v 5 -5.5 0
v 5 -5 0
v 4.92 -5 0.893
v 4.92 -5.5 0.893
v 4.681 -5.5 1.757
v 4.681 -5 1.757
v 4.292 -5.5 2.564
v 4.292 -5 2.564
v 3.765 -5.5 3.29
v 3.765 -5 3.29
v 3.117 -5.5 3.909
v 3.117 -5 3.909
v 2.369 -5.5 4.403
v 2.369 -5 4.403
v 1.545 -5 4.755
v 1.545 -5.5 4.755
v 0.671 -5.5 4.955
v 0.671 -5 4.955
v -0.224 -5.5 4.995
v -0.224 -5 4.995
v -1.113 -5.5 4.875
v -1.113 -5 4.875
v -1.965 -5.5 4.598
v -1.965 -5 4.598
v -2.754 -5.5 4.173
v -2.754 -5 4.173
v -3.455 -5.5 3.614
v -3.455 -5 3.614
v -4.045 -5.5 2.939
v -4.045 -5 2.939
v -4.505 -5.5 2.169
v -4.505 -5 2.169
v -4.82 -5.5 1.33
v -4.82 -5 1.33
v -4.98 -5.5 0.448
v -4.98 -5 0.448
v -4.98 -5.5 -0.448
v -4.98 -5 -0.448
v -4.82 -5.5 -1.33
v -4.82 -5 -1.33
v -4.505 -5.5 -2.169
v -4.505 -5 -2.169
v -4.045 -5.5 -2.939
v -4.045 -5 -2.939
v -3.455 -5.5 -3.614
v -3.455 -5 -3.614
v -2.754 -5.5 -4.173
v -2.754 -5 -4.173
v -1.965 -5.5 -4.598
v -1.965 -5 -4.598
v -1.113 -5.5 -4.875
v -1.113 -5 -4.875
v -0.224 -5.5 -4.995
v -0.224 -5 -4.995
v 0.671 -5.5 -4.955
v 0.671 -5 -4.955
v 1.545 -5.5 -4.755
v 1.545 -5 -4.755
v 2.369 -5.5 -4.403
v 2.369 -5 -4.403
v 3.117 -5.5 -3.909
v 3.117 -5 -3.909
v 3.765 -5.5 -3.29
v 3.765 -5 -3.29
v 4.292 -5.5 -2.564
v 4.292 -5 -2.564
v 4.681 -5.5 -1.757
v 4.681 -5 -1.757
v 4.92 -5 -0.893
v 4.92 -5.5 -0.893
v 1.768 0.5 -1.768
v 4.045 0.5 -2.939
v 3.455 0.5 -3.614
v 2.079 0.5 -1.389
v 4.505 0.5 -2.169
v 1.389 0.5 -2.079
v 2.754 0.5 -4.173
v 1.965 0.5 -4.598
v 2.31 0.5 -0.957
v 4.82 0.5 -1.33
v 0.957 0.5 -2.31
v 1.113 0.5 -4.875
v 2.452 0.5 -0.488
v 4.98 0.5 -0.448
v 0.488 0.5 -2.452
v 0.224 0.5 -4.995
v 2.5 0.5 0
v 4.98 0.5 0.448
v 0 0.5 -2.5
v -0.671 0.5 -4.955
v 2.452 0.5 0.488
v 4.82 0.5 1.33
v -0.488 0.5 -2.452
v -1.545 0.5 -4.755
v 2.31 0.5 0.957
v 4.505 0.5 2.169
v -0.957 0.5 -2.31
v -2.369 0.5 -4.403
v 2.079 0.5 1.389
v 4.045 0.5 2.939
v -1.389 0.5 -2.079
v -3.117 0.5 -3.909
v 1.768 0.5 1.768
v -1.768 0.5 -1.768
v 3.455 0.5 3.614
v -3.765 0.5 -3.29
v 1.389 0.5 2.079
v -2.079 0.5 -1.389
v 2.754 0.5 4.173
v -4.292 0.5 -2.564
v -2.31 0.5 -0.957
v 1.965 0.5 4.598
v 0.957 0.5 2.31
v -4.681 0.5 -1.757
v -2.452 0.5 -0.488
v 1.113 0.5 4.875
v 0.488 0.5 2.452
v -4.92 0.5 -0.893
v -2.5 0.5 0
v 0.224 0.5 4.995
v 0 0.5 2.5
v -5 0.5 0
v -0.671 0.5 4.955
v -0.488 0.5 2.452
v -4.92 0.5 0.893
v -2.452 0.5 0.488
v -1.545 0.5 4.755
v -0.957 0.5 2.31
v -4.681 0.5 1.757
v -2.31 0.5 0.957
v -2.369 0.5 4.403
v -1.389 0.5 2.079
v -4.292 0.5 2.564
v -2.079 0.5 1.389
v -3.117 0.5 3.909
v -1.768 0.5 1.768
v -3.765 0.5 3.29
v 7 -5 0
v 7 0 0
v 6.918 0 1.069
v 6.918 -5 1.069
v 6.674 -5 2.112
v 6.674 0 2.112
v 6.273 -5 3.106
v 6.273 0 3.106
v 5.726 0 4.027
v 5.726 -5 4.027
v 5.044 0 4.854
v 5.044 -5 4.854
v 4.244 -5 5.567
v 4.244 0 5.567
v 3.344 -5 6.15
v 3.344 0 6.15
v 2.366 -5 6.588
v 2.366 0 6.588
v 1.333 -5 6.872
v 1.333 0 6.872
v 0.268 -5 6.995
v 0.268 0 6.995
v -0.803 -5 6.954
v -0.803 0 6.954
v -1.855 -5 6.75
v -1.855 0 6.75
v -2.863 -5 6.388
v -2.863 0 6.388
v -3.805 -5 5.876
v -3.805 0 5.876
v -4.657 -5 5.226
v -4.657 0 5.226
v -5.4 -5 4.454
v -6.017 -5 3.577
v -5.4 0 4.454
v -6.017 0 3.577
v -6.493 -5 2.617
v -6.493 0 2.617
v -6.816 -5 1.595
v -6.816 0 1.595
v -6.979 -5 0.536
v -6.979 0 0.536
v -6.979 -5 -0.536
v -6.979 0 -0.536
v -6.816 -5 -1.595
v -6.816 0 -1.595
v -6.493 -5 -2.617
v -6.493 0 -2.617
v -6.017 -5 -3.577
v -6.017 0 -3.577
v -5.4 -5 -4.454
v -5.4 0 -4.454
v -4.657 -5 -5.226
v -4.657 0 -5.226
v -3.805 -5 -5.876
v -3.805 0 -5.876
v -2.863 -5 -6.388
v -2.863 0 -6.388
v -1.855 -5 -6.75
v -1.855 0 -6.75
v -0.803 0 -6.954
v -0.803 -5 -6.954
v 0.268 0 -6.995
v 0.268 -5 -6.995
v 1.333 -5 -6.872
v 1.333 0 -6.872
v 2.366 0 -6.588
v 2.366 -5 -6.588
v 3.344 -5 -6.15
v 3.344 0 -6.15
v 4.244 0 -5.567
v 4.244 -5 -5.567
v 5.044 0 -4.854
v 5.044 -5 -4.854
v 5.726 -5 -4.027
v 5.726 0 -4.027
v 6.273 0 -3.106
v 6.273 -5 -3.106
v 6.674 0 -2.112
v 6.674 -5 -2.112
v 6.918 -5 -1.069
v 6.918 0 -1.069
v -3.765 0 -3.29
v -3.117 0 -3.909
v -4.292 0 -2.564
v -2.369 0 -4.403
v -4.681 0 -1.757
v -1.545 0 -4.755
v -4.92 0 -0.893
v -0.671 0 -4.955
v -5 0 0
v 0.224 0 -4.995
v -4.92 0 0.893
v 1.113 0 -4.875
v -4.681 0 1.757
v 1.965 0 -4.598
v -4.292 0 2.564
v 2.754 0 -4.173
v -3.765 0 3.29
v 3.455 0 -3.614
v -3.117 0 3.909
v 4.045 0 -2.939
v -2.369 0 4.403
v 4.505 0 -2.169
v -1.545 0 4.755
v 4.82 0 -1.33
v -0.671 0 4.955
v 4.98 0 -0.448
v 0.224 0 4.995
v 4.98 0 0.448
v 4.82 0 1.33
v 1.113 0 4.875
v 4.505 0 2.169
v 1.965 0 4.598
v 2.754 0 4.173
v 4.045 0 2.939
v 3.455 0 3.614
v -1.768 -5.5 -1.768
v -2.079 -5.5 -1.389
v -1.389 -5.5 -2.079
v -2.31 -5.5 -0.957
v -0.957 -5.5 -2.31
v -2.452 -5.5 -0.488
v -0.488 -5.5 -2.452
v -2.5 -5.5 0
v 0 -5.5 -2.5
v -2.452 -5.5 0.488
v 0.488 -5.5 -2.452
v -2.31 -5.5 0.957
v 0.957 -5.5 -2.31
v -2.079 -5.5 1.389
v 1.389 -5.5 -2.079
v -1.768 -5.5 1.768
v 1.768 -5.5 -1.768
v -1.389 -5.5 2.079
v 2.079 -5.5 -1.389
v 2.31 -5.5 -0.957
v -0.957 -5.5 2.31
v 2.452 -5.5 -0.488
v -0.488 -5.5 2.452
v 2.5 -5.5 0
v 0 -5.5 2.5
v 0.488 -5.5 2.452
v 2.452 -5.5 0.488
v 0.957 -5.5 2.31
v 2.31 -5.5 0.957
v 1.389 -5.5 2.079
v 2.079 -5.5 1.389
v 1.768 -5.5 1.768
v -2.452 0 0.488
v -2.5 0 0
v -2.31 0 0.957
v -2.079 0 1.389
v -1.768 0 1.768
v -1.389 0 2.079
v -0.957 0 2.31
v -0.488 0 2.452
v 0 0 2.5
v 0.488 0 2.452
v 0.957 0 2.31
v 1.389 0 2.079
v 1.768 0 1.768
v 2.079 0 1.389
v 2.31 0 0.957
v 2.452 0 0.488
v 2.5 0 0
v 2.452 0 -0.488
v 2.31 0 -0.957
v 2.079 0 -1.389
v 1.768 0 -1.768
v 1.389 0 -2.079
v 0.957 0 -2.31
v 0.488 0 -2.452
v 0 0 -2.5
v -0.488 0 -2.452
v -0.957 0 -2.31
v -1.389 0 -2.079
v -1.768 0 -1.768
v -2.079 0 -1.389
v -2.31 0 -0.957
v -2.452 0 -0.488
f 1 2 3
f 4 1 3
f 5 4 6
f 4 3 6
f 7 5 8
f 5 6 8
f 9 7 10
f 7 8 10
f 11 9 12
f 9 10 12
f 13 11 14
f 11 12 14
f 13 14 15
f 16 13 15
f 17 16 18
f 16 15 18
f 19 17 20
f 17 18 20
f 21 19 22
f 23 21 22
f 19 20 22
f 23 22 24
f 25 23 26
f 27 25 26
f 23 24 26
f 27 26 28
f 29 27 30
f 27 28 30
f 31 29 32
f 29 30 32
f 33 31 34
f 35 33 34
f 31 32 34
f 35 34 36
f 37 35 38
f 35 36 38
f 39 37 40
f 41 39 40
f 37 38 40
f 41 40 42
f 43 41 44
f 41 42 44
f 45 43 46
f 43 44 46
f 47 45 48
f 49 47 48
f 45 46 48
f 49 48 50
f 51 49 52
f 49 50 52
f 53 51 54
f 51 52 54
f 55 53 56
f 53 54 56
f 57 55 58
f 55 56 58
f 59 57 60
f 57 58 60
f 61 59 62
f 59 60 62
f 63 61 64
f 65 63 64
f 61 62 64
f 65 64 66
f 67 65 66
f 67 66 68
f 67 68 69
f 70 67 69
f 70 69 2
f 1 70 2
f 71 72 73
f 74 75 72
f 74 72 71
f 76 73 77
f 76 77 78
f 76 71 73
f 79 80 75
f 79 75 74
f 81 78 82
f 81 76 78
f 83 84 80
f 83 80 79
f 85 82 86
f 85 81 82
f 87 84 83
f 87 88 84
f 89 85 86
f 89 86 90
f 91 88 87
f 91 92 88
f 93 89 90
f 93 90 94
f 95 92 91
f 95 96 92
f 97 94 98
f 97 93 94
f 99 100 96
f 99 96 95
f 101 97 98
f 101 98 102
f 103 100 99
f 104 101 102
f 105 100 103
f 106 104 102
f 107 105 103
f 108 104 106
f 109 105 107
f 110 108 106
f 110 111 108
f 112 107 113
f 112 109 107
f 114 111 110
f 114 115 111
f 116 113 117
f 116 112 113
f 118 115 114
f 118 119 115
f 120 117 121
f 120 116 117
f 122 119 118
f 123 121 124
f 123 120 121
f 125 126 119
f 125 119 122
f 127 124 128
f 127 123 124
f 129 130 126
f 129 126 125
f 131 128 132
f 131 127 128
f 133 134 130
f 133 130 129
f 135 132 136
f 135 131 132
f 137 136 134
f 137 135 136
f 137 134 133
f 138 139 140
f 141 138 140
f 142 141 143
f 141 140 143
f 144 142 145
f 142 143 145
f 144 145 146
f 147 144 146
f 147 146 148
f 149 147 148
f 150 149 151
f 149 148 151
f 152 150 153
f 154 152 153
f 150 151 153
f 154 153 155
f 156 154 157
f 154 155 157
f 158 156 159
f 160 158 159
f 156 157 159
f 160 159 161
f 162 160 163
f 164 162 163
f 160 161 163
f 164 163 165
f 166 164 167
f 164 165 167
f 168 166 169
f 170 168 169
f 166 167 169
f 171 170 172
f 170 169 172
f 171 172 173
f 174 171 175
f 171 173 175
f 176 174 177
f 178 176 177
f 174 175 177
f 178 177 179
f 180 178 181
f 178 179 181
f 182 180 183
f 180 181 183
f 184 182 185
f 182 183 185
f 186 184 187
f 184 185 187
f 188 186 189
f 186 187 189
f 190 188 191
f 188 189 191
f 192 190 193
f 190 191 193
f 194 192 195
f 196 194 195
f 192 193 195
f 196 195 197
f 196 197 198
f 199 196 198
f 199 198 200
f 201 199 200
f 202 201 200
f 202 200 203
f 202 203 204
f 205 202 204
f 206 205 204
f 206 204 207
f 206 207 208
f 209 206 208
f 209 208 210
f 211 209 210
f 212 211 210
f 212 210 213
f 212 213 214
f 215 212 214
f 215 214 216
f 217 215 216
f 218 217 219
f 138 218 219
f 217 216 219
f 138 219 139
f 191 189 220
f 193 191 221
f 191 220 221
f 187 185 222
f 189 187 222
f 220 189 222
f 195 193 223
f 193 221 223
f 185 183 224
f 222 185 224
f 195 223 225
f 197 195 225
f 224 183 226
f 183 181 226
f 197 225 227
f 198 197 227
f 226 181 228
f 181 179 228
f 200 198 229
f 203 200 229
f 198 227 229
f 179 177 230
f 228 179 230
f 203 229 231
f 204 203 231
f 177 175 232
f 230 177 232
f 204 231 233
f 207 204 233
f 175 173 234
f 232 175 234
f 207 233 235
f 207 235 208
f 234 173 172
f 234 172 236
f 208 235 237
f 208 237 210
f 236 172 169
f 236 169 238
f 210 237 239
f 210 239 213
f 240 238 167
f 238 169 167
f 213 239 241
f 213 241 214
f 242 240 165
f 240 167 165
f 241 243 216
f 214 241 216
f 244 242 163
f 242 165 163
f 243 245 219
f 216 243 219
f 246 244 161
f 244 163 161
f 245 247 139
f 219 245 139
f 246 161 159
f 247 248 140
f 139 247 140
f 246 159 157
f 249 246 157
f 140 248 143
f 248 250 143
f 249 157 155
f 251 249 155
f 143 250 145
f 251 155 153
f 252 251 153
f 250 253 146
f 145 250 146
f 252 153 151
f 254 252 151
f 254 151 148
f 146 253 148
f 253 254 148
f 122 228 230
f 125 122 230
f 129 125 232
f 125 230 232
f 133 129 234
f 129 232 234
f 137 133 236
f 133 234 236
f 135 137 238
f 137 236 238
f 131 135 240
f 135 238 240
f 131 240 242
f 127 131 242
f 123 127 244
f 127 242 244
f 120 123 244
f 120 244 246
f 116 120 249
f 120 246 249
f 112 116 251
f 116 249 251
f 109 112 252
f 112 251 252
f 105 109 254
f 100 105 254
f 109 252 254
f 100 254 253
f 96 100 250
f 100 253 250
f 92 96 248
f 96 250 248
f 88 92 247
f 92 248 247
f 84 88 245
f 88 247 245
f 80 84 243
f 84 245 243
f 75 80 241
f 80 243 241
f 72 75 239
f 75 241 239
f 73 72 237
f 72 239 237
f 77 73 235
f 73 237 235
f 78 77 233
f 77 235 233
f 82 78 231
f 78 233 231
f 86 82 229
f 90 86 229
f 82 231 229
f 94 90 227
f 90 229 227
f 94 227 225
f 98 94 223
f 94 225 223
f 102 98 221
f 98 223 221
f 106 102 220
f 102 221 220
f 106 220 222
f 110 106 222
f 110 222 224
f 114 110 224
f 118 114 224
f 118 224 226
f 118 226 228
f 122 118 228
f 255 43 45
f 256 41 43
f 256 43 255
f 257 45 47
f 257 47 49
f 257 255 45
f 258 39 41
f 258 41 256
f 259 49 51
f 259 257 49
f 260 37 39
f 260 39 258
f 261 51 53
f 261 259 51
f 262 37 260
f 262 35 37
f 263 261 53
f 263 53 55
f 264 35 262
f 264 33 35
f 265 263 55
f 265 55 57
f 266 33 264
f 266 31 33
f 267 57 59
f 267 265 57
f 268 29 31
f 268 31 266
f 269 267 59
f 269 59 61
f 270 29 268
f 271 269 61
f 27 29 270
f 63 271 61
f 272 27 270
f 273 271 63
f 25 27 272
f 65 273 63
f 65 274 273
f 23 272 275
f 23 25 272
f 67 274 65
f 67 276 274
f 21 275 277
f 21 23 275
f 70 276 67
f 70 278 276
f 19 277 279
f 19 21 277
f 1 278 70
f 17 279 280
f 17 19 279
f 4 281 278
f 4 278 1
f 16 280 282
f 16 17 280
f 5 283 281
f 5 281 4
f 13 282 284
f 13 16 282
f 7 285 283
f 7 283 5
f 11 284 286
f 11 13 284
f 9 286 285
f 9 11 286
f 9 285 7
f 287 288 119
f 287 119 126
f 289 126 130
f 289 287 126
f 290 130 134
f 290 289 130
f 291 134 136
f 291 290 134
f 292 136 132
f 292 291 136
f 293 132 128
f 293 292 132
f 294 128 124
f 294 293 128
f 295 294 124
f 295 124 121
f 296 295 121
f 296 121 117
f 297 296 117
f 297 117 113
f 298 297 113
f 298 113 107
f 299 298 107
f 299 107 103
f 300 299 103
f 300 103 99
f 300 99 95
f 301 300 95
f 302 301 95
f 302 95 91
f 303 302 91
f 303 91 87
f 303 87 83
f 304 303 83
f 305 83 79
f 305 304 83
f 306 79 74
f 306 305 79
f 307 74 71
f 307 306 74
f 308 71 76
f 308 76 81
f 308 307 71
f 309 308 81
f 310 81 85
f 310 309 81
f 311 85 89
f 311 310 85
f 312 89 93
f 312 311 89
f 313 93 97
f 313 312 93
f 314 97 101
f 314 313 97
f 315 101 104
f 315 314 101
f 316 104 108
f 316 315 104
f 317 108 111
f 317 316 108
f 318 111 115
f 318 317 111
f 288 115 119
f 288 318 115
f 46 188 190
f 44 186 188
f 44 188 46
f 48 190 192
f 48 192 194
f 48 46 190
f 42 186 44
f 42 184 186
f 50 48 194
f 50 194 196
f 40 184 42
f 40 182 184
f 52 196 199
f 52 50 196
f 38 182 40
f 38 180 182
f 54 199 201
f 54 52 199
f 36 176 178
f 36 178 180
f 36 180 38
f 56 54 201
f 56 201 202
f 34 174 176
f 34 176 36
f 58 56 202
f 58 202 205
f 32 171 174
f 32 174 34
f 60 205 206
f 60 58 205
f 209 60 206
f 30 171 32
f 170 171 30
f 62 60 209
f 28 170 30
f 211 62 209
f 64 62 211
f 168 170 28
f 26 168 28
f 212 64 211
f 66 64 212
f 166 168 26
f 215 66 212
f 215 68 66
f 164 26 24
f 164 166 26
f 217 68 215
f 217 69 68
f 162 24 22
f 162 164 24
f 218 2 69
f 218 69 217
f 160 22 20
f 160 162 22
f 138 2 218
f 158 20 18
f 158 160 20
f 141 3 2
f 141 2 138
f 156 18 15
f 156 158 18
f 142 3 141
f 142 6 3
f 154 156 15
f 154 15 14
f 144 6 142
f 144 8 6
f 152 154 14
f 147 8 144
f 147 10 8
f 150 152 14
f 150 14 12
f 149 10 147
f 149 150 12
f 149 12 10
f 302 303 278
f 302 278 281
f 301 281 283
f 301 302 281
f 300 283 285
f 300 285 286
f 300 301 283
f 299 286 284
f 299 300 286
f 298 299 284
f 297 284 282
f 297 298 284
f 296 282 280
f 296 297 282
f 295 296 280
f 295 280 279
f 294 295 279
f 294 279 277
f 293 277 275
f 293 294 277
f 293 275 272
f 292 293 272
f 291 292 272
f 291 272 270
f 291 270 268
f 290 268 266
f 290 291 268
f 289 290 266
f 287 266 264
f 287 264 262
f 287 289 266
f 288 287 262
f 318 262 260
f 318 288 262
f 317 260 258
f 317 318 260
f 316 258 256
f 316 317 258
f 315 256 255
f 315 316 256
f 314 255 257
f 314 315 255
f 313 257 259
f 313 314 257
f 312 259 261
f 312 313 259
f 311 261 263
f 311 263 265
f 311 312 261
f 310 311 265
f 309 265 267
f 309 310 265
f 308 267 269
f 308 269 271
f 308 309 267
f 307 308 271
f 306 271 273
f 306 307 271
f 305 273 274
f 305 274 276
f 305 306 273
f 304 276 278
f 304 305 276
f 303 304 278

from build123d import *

# Parameters (mm, degrees)
F0_R     = 7
F0_R_2   = 2.5
F1_DEPTH = 5
F2_R     = 5
F2_R_2   = 2.5
F3_DEPTH = 0.5
F4_R     = 5
F4_R_2   = 2.5
F5_DEPTH = 0.5


with BuildPart() as f1:
    # F0 (on Front) → F1 (new body)
    with BuildSketch(Plane.XZ):
        Circle(F0_R)
        Circle(F0_R_2, mode=Mode.SUBTRACT)
    extrude(amount=F1_DEPTH)

    # F2 (on face) → F3 (join)
    with BuildSketch(Plane.XZ.offset(5)):
        Circle(F2_R)
        Circle(F2_R_2, mode=Mode.SUBTRACT)
    extrude(amount=F3_DEPTH)

    # F4 (on face) → F5 (join)
    with BuildSketch(Plane(origin=(0, 0, 0), x_dir=(-1, 0, 0), z_dir=(0, 1, 0))):
        Circle(F4_R)
        Circle(F4_R_2, mode=Mode.SUBTRACT)
    extrude(amount=F5_DEPTH)


solid = f1.part
